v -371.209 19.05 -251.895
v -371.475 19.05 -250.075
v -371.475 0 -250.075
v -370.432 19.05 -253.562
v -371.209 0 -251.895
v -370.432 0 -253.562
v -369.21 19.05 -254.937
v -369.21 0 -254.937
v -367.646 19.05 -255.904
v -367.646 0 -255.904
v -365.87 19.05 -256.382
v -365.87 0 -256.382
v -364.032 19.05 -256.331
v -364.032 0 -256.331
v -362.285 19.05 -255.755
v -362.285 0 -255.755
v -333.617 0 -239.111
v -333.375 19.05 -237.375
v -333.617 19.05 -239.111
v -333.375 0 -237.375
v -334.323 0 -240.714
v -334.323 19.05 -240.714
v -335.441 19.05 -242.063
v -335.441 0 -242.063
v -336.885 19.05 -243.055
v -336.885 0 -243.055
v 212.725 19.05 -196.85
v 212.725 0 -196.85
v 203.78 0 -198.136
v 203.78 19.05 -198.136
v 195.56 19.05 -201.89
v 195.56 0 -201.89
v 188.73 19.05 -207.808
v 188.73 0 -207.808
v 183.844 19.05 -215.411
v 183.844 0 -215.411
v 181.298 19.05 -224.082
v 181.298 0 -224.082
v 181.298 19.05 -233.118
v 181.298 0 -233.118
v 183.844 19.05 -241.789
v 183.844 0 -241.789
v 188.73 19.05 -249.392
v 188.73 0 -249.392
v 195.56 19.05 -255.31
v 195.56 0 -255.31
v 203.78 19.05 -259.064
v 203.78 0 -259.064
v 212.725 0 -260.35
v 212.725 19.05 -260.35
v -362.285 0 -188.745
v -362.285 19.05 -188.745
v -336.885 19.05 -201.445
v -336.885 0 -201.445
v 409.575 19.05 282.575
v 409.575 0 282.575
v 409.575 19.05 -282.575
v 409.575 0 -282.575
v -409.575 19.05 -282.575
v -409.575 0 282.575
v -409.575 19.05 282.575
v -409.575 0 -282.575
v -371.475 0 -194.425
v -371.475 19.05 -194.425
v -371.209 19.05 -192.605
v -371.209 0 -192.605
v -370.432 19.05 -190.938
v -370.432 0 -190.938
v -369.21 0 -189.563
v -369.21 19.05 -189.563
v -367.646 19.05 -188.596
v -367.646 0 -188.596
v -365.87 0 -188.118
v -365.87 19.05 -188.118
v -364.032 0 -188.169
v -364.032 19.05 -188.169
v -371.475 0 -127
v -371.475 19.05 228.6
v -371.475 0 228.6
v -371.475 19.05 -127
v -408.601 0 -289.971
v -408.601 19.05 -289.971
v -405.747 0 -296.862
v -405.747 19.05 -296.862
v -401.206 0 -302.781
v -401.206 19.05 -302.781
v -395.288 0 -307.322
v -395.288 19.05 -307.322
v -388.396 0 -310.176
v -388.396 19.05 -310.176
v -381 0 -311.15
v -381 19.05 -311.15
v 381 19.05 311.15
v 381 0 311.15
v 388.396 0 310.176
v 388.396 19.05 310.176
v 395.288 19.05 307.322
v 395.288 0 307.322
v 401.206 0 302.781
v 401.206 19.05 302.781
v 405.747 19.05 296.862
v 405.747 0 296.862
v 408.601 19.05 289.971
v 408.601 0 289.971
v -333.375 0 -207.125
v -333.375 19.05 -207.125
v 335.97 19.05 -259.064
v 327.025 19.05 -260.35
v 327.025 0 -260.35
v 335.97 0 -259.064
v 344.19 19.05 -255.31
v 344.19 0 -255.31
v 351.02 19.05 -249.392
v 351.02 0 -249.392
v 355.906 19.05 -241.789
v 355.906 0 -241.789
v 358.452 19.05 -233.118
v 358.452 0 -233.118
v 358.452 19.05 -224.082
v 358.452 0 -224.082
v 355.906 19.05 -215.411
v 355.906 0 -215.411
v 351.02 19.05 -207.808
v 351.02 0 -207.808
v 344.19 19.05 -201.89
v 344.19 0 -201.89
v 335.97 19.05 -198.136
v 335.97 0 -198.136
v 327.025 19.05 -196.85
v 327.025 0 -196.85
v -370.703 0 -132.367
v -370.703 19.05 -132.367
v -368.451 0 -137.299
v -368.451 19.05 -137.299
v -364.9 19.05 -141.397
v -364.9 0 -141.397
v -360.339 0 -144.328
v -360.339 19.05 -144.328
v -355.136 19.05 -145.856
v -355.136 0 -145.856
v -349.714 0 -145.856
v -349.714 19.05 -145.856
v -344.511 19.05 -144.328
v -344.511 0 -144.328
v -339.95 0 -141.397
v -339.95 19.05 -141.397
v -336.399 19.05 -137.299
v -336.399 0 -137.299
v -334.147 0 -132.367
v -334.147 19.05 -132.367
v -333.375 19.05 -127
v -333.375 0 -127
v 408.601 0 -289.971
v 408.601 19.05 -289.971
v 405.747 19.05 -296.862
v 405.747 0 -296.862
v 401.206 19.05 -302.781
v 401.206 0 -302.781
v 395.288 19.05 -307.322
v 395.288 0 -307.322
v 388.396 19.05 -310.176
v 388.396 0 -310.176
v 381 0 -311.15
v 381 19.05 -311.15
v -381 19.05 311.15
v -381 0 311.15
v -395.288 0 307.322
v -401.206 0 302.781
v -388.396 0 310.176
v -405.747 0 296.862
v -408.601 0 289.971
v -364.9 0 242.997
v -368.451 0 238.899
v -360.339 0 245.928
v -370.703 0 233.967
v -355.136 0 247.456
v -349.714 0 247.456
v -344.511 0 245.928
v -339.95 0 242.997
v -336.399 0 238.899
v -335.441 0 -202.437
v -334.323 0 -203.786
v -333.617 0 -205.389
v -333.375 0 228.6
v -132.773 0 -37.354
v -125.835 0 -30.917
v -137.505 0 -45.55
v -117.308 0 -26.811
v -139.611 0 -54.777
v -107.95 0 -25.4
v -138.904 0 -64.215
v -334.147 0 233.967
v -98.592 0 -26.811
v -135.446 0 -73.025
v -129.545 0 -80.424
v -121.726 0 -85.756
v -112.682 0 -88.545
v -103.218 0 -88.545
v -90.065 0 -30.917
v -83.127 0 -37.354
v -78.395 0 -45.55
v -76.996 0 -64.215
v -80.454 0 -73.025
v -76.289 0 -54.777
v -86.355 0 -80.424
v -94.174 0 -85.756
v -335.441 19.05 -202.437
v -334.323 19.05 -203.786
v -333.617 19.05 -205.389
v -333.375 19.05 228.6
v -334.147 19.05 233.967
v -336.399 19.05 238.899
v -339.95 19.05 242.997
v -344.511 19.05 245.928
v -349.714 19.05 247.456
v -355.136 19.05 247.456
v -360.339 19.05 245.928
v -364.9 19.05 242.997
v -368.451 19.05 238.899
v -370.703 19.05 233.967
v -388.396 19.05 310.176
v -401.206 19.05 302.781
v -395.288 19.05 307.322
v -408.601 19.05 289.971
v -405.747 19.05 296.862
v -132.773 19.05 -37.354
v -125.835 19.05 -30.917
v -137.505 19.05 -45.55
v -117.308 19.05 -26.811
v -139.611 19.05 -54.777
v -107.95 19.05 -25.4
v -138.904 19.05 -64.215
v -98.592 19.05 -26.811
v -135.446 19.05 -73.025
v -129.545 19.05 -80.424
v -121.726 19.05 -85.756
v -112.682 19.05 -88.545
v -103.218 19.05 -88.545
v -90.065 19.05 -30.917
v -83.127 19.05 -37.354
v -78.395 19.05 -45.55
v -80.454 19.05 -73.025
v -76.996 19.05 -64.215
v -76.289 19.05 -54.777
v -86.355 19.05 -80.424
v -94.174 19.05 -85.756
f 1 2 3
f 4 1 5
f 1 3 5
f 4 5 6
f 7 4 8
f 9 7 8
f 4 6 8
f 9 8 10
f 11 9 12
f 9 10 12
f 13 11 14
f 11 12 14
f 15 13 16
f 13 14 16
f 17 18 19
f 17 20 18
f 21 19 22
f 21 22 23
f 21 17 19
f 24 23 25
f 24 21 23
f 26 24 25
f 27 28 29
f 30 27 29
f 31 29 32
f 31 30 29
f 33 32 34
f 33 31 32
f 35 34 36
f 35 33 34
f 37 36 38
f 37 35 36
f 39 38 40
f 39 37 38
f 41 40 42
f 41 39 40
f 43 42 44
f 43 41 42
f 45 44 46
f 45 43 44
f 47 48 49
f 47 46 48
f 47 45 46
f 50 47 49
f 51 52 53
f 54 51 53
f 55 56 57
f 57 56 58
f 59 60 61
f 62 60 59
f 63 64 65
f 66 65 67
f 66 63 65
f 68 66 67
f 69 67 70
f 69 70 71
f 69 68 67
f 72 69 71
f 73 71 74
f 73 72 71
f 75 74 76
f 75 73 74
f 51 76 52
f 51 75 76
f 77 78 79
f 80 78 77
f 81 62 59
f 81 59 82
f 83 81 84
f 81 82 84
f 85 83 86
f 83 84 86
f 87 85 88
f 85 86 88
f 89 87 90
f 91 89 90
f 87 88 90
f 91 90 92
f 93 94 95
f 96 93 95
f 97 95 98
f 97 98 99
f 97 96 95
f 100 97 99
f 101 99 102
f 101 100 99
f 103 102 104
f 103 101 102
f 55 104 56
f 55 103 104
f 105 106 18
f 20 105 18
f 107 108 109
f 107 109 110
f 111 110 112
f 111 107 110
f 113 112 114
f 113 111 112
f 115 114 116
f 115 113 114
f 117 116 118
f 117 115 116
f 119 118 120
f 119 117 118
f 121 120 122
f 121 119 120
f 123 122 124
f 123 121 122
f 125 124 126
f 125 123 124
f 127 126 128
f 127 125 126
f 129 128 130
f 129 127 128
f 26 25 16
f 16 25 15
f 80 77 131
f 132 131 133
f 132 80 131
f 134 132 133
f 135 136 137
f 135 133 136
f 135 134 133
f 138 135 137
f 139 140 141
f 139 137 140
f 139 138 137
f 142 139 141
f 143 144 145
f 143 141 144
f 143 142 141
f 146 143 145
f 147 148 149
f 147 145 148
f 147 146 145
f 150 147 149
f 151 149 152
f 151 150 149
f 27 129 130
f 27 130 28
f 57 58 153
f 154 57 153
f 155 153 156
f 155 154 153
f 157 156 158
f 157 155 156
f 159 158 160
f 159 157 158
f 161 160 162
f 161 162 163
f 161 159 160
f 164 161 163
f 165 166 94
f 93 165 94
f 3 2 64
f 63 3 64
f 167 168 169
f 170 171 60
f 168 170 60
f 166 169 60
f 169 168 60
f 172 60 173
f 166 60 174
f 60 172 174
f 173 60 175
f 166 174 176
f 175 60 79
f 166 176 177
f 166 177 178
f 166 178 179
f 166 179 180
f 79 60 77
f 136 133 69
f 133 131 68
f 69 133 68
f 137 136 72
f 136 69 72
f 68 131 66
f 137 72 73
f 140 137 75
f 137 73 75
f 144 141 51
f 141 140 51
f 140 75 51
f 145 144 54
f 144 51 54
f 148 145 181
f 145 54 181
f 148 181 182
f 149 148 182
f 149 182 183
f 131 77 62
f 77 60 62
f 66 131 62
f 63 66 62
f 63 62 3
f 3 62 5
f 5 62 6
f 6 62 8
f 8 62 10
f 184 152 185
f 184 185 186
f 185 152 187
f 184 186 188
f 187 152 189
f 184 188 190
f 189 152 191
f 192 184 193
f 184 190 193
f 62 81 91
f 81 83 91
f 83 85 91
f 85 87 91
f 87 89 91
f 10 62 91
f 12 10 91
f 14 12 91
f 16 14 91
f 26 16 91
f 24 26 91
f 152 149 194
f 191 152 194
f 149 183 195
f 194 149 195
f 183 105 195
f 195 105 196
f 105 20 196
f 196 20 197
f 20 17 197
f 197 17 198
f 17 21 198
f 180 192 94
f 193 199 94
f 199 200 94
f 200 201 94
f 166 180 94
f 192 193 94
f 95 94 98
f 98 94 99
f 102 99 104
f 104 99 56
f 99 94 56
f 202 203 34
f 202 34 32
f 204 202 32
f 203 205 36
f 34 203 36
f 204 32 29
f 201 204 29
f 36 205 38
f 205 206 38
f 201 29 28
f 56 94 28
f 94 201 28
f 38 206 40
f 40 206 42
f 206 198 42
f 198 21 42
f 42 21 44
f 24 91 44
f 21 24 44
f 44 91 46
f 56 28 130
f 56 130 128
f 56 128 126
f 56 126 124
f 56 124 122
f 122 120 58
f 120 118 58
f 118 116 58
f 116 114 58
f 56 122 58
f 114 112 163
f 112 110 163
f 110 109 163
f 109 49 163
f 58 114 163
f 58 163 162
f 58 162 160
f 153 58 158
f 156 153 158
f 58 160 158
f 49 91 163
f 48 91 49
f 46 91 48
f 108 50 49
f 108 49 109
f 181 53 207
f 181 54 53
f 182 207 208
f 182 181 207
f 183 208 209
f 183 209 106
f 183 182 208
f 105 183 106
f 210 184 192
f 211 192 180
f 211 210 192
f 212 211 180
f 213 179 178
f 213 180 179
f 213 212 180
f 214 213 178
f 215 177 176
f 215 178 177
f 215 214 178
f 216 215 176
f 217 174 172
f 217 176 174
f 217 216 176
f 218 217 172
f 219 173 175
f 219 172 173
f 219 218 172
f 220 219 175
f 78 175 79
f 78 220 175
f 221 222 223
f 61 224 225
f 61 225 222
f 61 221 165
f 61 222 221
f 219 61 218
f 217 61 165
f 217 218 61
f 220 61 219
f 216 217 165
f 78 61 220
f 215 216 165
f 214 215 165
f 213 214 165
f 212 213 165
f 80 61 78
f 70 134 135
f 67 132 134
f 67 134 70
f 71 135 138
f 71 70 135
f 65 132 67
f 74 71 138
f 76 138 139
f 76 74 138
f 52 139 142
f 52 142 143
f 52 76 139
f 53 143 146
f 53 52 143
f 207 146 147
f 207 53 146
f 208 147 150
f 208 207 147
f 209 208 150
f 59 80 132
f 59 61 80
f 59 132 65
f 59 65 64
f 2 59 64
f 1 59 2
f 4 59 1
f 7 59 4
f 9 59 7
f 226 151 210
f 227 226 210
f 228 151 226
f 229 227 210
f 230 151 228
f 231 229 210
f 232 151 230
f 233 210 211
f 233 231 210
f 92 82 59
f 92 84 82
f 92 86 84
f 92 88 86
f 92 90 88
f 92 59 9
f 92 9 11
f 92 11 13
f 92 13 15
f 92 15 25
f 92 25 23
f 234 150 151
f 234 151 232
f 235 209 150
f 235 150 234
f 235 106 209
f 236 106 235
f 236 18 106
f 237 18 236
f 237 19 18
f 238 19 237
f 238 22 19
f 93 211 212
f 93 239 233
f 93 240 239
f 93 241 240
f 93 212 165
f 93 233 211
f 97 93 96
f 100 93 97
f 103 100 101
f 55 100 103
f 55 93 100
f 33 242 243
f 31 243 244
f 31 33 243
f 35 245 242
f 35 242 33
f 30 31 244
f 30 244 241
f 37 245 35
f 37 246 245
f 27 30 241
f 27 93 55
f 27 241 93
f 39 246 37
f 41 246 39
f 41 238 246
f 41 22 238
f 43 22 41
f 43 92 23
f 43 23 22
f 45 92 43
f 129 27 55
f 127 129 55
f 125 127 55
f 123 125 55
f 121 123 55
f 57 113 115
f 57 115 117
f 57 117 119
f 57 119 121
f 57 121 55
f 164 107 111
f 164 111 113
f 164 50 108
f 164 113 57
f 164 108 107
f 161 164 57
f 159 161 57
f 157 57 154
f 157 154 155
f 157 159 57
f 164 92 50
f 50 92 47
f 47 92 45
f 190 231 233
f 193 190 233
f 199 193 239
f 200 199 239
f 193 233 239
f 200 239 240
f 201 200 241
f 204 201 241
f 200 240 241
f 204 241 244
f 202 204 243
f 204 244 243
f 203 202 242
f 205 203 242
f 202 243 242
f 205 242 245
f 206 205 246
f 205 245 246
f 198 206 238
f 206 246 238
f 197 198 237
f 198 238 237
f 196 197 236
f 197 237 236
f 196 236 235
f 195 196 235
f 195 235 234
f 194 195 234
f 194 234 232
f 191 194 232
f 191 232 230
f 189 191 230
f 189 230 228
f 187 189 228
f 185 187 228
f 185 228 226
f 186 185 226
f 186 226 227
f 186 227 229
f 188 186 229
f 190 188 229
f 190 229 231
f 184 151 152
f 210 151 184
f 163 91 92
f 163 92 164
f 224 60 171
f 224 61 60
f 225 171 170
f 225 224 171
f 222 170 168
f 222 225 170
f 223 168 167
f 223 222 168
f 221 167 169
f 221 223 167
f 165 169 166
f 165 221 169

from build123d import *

# Parameters (mm, degrees)
SKETCH1_W           = 819.15
SKETCH1_H           = 622.3
BOSS_EXTRUDE1_DEPTH = 19.05
FILLET1_R           = 28.575
SKETCH2_R           = 31.75
CUT_EXTRUDE1_DEPTH  = 515.712449456
CUT_EXTRUDE2_DEPTH  = 515.712449456
CUT_EXTRUDE3_DEPTH  = 515.712449456
FILLET2_R           = 6.35
CUT_EXTRUDE4_DEPTH  = 515.712449456


with BuildPart() as part:
    # Sketch1 → Boss-Extrude1 (new body)
    with BuildSketch(Plane(origin=(0, 0, 0), x_dir=(1, 0, 0), z_dir=(0, 1, 0))):
        Rectangle(SKETCH1_W, SKETCH1_H)
    extrude(amount=BOSS_EXTRUDE1_DEPTH)

    # Fillet1
    fillet1_edges = [part.edges().sort_by_distance(p)[0] for p in [
        (409.575, 9.525, 311.15),
        (-409.575, 9.525, 311.15),
        (-409.575, 9.525, -311.15),
        (409.575, 9.525, -311.15),
    ]]
    fillet(fillet1_edges, radius=FILLET1_R)

    # Sketch2 → Cut-Extrude1 (cut, through all)
    with BuildSketch(Plane(origin=(0, 19.05, 0), x_dir=(1, 0, 0), z_dir=(0, 1, 0))):
        with Locations(Location((-107.95, 57.15, 0), (0, 0, 270))):
            Circle(SKETCH2_R)
    extrude(amount=-CUT_EXTRUDE1_DEPTH, mode=Mode.SUBTRACT)

    # Sketch3 → Cut-Extrude2 (cut, through all)
    with BuildSketch(Plane(origin=(0, 19.05, 0), x_dir=(1, 0, 0), z_dir=(0, 1, 0))):
        with BuildLine():
            Line((-333.375, 127), (-333.375, -228.6))
            ThreePointArc((-333.375, -228.6), (-352.425, -247.65), (-371.475, -228.6))
            Line((-371.475, -228.6), (-371.475, 127))
            ThreePointArc((-371.475, 127), (-352.425, 146.05), (-333.375, 127))
        make_face()
    extrude(amount=-CUT_EXTRUDE2_DEPTH, mode=Mode.SUBTRACT)

    # Sketch4 → Cut-Extrude3 (cut, through all)
    with BuildSketch(Plane(origin=(0, 19.05, 0), x_dir=(1, 0, 0), z_dir=(0, 1, 0))):
        Polygon((-371.475, 260.35), (-371.475, 184.15), (-333.375, 203.2), (-333.375, 241.3), align=None)
    extrude(amount=-CUT_EXTRUDE3_DEPTH, mode=Mode.SUBTRACT)

    # Fillet2
    fillet2_edges = [part.edges().sort_by_distance(p)[0] for p in [
        (-371.475, 9.525, -260.35),
        (-333.375, 9.525, -241.3),
        (-333.375, 9.525, -203.2),
        (-371.475, 9.525, -184.15),
    ]]
    fillet(fillet2_edges, radius=FILLET2_R)

    # Sketch5 → Cut-Extrude4 (cut, through all)
    with BuildSketch(Plane(origin=(0, 19.05, 0), x_dir=(1, 0, 0), z_dir=(0, 1, 0))):
        with BuildLine():
            Line((327.025, 196.85), (212.725, 196.85))
            ThreePointArc((212.725, 196.85), (180.975, 228.6), (212.725, 260.35))
            Line((212.725, 260.35), (327.025, 260.35))
            ThreePointArc((327.025, 260.35), (358.775, 228.6), (327.025, 196.85))
        make_face()
    extrude(amount=-CUT_EXTRUDE4_DEPTH, mode=Mode.SUBTRACT)


solid = part.part
